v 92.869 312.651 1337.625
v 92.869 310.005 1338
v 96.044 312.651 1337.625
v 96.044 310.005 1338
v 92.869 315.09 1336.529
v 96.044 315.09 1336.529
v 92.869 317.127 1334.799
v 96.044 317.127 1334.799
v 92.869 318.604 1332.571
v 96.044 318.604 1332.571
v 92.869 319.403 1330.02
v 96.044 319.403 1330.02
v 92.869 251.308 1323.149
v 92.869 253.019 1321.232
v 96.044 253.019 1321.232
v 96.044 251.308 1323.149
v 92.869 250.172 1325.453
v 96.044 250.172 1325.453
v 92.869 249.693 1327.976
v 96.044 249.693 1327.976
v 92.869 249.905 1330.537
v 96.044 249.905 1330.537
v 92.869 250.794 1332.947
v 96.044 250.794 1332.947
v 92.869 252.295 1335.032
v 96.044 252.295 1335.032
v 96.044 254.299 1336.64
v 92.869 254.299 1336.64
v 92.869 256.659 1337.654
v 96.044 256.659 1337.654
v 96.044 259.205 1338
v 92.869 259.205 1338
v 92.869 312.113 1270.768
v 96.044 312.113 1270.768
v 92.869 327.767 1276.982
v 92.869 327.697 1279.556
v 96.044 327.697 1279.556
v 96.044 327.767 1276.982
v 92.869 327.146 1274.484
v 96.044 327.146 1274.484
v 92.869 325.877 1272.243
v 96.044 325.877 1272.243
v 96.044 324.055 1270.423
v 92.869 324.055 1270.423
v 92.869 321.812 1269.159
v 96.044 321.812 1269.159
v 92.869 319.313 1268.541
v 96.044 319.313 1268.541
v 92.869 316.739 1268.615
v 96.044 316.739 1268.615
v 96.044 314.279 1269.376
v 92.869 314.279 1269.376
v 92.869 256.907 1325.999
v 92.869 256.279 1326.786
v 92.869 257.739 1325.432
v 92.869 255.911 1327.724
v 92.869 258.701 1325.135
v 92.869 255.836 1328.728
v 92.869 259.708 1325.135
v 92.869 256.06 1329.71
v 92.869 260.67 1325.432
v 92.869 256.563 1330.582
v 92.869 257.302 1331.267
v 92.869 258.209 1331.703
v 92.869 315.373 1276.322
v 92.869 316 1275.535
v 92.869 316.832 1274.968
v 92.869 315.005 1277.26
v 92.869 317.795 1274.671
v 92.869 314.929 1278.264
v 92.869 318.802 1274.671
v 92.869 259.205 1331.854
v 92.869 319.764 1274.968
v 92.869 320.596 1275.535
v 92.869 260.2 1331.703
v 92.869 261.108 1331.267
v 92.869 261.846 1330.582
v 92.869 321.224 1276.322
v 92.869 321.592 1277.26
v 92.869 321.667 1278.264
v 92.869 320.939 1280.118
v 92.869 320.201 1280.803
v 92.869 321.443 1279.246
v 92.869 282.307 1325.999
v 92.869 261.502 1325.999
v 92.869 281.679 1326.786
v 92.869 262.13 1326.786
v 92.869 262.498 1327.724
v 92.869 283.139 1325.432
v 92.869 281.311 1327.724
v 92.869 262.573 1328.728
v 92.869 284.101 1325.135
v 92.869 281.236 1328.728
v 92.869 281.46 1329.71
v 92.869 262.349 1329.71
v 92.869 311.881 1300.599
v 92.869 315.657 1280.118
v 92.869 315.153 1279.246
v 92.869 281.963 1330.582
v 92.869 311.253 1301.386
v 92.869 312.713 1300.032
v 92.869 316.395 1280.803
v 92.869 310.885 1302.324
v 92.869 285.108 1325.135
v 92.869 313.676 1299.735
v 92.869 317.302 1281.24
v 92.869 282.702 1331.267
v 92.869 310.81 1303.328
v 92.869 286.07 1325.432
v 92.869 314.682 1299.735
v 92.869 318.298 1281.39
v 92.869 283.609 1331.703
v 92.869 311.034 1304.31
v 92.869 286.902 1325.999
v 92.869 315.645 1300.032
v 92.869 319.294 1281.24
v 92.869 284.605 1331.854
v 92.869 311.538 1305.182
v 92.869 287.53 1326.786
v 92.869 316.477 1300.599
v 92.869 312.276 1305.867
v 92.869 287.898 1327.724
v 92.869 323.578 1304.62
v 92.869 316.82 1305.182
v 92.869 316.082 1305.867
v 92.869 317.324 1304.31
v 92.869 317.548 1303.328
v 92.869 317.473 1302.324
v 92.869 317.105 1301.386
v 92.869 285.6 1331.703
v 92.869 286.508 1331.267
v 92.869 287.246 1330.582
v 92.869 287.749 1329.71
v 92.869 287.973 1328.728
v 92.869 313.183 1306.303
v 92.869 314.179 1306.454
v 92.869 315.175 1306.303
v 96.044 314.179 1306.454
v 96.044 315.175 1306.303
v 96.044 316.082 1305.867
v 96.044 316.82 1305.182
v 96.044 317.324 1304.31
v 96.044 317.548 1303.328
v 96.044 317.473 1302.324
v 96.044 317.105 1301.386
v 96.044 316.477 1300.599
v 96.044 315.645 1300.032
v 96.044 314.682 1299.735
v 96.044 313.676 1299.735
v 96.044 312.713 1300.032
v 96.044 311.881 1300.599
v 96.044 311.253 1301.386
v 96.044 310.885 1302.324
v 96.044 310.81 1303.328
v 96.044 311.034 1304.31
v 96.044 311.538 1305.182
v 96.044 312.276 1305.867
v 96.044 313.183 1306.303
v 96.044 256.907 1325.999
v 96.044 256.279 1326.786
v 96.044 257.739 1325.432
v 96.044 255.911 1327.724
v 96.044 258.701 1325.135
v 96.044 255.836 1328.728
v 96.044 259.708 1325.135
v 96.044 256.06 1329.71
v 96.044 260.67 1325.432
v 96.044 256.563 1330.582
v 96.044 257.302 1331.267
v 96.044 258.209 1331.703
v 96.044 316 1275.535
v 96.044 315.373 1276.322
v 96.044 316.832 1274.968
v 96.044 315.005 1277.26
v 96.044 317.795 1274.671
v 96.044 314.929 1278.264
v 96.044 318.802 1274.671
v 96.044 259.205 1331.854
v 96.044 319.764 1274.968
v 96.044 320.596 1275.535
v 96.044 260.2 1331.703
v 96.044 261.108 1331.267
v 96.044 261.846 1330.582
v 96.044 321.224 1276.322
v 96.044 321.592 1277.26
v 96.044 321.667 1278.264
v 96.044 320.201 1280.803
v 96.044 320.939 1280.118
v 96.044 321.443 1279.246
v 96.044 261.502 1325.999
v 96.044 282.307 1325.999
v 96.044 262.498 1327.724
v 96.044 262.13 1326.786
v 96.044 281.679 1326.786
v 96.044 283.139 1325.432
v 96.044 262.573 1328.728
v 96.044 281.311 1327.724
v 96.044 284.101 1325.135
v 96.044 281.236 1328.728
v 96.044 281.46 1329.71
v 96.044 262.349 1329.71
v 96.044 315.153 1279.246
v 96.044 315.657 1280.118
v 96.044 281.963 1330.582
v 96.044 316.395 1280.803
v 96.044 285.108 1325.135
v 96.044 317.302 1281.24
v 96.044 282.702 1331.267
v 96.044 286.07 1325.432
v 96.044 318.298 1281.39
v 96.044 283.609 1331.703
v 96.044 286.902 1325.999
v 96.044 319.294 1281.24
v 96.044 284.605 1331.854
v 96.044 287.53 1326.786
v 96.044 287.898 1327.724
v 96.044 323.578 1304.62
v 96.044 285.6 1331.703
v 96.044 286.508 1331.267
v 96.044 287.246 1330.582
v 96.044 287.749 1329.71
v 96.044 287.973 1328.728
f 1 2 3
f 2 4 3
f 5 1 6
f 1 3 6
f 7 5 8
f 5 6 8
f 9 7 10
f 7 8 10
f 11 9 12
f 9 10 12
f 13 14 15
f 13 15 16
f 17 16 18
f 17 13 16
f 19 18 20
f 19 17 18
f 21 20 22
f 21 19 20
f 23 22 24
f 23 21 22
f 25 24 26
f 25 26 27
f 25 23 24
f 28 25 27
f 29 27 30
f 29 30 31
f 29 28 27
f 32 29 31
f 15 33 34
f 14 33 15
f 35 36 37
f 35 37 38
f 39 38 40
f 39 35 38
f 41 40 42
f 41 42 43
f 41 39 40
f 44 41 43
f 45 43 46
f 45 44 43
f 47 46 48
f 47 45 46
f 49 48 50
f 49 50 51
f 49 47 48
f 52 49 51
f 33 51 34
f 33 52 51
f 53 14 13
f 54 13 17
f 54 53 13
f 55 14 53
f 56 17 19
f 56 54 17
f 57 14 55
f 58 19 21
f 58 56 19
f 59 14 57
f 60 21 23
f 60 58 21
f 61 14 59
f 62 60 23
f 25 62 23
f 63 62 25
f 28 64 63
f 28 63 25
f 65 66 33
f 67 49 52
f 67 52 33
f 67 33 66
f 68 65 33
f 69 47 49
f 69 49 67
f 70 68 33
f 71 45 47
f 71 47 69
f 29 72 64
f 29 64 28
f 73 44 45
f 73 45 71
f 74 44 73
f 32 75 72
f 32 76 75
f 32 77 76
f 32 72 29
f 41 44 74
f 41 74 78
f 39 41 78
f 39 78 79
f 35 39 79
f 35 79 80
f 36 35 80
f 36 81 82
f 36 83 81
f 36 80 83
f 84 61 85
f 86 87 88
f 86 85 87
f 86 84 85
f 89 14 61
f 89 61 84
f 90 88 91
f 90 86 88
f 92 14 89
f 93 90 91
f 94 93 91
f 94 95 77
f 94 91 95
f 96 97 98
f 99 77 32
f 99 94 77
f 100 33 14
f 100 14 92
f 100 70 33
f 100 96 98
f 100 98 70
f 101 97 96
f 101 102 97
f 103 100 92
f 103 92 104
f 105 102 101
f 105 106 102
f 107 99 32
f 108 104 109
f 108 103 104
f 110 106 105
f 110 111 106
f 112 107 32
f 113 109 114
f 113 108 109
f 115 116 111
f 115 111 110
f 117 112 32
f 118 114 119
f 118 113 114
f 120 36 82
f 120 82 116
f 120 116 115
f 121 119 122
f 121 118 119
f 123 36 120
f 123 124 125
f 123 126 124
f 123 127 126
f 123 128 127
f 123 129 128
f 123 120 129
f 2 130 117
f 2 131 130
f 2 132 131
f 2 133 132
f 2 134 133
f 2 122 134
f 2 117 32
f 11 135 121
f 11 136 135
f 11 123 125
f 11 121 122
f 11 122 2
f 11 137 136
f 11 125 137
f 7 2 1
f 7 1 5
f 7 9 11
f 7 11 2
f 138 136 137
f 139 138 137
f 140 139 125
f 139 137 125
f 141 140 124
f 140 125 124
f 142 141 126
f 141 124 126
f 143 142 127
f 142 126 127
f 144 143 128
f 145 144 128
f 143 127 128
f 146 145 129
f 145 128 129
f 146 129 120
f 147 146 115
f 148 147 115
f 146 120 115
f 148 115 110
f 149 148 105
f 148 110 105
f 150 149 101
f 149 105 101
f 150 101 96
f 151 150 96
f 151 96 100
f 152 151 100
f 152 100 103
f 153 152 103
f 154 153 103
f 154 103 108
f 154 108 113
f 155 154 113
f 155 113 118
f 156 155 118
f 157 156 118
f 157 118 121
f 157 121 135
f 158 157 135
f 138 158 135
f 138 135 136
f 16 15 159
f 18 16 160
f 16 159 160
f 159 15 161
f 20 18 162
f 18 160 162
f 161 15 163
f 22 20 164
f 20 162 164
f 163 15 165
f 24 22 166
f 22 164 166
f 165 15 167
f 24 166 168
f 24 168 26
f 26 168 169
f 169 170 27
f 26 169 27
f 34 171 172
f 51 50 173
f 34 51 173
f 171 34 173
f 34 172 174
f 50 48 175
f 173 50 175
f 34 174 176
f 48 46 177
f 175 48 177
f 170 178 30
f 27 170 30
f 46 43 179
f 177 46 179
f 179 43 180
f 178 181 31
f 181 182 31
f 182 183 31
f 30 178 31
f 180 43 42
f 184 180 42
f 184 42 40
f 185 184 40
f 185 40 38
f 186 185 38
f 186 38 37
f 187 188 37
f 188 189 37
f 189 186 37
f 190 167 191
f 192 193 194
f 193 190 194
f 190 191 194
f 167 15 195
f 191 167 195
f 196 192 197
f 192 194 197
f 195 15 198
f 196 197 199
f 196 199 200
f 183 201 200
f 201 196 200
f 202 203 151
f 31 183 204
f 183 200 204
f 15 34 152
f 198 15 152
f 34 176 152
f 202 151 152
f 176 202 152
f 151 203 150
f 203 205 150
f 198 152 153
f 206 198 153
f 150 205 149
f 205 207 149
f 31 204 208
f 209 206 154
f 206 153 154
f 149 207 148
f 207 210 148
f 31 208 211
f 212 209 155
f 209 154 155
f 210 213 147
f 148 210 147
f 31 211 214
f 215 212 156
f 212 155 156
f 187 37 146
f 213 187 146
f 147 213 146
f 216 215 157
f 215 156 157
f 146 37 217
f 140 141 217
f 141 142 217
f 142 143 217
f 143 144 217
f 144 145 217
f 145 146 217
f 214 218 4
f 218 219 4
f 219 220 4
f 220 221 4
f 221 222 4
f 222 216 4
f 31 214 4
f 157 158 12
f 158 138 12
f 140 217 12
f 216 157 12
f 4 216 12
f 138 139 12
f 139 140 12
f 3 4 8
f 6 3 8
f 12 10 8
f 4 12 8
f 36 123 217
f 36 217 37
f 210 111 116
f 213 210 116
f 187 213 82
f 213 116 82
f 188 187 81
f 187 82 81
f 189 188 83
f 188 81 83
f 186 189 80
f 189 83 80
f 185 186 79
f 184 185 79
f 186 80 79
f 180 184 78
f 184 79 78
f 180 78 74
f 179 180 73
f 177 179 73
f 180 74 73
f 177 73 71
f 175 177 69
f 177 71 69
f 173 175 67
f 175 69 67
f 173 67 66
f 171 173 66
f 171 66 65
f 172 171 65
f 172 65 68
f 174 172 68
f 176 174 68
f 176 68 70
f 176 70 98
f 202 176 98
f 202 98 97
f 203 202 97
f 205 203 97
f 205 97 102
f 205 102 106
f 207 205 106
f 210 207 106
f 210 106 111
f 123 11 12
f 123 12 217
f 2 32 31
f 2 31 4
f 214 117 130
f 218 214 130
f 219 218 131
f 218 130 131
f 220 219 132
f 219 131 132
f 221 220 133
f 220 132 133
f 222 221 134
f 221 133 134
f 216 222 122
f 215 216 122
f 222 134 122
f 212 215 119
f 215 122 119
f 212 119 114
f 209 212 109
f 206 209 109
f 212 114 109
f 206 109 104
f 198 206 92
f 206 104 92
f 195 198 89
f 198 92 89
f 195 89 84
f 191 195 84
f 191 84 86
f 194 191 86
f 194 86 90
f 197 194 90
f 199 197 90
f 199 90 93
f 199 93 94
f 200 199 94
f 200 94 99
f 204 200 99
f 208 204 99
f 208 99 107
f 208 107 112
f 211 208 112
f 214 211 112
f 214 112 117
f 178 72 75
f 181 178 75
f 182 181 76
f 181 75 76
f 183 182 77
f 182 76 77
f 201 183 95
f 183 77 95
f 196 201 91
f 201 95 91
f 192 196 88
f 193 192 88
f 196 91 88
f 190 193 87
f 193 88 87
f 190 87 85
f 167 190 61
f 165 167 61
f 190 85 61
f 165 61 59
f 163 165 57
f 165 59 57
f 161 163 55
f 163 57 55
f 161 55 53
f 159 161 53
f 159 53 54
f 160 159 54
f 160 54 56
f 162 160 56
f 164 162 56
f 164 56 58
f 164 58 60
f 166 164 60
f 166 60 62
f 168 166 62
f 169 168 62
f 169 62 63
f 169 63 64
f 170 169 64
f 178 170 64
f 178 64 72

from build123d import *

# Parameters (mm, degrees)
BOSS_EXTRUDE1_START     = 92.868812
BOSS_EXTRUDE1_DEPTH     = 3.175
FILLET1_R               = 9.525
F_1_4_CLEARANCE_HOLE1_D = 6.7564


with BuildPart() as part:
    # Sketch1 → Boss-Extrude1 (new body)
    with BuildSketch(Plane(origin=(0, 0, 0), x_dir=(0, 0, -1), z_dir=(1, 0, 0)).offset(BOSS_EXTRUDE1_START)):
        with BuildLine():
            Line((-1304.620022056, 323.577914146), (-1279.556254241, 327.697081886))
            ThreePointArc((-1279.556254241, 327.697081886), (-1269.714759772, 322.976697122), (-1270.768280058, 312.11266745))
            Line((-1270.768280058, 312.11266745), (-1321.232047874, 253.01907305))
            ThreePointArc((-1321.232047874, 253.01907305), (-1331.771796135, 250.268190307), (-1338.000334154, 259.204574554))
            Line((-1338.000334154, 259.204574554), (-1338.000334154, 284.604574554))
            Line((-1338.000334154, 284.604574554), (-1338.000334154, 318.091943092))
            Line((-1338.000334154, 318.091943092), (-1304.620022056, 323.577914146))
        make_face()
    extrude(amount=BOSS_EXTRUDE1_DEPTH)

    # Fillet1
    fillet1_edges = [part.edges().sort_by_distance(p)[0] for p in [
        (94.456312, 318.091943092, 1338.000334154),
    ]]
    fillet(fillet1_edges, radius=FILLET1_R)

    # 1/4 Clearance Hole1 (through all)
    with Locations(Plane(origin=(96.043812484, 0, 0), x_dir=(0, 0, -1), z_dir=(1, 0, 0))):
        with Locations((-1303.075334154, 314.179001215), (-1278.011566338, 318.298168955), (-1328.475334154, 284.604574554), (-1328.475334154, 259.204574554)):
            Hole(F_1_4_CLEARANCE_HOLE1_D / 2)


solid = part.part
